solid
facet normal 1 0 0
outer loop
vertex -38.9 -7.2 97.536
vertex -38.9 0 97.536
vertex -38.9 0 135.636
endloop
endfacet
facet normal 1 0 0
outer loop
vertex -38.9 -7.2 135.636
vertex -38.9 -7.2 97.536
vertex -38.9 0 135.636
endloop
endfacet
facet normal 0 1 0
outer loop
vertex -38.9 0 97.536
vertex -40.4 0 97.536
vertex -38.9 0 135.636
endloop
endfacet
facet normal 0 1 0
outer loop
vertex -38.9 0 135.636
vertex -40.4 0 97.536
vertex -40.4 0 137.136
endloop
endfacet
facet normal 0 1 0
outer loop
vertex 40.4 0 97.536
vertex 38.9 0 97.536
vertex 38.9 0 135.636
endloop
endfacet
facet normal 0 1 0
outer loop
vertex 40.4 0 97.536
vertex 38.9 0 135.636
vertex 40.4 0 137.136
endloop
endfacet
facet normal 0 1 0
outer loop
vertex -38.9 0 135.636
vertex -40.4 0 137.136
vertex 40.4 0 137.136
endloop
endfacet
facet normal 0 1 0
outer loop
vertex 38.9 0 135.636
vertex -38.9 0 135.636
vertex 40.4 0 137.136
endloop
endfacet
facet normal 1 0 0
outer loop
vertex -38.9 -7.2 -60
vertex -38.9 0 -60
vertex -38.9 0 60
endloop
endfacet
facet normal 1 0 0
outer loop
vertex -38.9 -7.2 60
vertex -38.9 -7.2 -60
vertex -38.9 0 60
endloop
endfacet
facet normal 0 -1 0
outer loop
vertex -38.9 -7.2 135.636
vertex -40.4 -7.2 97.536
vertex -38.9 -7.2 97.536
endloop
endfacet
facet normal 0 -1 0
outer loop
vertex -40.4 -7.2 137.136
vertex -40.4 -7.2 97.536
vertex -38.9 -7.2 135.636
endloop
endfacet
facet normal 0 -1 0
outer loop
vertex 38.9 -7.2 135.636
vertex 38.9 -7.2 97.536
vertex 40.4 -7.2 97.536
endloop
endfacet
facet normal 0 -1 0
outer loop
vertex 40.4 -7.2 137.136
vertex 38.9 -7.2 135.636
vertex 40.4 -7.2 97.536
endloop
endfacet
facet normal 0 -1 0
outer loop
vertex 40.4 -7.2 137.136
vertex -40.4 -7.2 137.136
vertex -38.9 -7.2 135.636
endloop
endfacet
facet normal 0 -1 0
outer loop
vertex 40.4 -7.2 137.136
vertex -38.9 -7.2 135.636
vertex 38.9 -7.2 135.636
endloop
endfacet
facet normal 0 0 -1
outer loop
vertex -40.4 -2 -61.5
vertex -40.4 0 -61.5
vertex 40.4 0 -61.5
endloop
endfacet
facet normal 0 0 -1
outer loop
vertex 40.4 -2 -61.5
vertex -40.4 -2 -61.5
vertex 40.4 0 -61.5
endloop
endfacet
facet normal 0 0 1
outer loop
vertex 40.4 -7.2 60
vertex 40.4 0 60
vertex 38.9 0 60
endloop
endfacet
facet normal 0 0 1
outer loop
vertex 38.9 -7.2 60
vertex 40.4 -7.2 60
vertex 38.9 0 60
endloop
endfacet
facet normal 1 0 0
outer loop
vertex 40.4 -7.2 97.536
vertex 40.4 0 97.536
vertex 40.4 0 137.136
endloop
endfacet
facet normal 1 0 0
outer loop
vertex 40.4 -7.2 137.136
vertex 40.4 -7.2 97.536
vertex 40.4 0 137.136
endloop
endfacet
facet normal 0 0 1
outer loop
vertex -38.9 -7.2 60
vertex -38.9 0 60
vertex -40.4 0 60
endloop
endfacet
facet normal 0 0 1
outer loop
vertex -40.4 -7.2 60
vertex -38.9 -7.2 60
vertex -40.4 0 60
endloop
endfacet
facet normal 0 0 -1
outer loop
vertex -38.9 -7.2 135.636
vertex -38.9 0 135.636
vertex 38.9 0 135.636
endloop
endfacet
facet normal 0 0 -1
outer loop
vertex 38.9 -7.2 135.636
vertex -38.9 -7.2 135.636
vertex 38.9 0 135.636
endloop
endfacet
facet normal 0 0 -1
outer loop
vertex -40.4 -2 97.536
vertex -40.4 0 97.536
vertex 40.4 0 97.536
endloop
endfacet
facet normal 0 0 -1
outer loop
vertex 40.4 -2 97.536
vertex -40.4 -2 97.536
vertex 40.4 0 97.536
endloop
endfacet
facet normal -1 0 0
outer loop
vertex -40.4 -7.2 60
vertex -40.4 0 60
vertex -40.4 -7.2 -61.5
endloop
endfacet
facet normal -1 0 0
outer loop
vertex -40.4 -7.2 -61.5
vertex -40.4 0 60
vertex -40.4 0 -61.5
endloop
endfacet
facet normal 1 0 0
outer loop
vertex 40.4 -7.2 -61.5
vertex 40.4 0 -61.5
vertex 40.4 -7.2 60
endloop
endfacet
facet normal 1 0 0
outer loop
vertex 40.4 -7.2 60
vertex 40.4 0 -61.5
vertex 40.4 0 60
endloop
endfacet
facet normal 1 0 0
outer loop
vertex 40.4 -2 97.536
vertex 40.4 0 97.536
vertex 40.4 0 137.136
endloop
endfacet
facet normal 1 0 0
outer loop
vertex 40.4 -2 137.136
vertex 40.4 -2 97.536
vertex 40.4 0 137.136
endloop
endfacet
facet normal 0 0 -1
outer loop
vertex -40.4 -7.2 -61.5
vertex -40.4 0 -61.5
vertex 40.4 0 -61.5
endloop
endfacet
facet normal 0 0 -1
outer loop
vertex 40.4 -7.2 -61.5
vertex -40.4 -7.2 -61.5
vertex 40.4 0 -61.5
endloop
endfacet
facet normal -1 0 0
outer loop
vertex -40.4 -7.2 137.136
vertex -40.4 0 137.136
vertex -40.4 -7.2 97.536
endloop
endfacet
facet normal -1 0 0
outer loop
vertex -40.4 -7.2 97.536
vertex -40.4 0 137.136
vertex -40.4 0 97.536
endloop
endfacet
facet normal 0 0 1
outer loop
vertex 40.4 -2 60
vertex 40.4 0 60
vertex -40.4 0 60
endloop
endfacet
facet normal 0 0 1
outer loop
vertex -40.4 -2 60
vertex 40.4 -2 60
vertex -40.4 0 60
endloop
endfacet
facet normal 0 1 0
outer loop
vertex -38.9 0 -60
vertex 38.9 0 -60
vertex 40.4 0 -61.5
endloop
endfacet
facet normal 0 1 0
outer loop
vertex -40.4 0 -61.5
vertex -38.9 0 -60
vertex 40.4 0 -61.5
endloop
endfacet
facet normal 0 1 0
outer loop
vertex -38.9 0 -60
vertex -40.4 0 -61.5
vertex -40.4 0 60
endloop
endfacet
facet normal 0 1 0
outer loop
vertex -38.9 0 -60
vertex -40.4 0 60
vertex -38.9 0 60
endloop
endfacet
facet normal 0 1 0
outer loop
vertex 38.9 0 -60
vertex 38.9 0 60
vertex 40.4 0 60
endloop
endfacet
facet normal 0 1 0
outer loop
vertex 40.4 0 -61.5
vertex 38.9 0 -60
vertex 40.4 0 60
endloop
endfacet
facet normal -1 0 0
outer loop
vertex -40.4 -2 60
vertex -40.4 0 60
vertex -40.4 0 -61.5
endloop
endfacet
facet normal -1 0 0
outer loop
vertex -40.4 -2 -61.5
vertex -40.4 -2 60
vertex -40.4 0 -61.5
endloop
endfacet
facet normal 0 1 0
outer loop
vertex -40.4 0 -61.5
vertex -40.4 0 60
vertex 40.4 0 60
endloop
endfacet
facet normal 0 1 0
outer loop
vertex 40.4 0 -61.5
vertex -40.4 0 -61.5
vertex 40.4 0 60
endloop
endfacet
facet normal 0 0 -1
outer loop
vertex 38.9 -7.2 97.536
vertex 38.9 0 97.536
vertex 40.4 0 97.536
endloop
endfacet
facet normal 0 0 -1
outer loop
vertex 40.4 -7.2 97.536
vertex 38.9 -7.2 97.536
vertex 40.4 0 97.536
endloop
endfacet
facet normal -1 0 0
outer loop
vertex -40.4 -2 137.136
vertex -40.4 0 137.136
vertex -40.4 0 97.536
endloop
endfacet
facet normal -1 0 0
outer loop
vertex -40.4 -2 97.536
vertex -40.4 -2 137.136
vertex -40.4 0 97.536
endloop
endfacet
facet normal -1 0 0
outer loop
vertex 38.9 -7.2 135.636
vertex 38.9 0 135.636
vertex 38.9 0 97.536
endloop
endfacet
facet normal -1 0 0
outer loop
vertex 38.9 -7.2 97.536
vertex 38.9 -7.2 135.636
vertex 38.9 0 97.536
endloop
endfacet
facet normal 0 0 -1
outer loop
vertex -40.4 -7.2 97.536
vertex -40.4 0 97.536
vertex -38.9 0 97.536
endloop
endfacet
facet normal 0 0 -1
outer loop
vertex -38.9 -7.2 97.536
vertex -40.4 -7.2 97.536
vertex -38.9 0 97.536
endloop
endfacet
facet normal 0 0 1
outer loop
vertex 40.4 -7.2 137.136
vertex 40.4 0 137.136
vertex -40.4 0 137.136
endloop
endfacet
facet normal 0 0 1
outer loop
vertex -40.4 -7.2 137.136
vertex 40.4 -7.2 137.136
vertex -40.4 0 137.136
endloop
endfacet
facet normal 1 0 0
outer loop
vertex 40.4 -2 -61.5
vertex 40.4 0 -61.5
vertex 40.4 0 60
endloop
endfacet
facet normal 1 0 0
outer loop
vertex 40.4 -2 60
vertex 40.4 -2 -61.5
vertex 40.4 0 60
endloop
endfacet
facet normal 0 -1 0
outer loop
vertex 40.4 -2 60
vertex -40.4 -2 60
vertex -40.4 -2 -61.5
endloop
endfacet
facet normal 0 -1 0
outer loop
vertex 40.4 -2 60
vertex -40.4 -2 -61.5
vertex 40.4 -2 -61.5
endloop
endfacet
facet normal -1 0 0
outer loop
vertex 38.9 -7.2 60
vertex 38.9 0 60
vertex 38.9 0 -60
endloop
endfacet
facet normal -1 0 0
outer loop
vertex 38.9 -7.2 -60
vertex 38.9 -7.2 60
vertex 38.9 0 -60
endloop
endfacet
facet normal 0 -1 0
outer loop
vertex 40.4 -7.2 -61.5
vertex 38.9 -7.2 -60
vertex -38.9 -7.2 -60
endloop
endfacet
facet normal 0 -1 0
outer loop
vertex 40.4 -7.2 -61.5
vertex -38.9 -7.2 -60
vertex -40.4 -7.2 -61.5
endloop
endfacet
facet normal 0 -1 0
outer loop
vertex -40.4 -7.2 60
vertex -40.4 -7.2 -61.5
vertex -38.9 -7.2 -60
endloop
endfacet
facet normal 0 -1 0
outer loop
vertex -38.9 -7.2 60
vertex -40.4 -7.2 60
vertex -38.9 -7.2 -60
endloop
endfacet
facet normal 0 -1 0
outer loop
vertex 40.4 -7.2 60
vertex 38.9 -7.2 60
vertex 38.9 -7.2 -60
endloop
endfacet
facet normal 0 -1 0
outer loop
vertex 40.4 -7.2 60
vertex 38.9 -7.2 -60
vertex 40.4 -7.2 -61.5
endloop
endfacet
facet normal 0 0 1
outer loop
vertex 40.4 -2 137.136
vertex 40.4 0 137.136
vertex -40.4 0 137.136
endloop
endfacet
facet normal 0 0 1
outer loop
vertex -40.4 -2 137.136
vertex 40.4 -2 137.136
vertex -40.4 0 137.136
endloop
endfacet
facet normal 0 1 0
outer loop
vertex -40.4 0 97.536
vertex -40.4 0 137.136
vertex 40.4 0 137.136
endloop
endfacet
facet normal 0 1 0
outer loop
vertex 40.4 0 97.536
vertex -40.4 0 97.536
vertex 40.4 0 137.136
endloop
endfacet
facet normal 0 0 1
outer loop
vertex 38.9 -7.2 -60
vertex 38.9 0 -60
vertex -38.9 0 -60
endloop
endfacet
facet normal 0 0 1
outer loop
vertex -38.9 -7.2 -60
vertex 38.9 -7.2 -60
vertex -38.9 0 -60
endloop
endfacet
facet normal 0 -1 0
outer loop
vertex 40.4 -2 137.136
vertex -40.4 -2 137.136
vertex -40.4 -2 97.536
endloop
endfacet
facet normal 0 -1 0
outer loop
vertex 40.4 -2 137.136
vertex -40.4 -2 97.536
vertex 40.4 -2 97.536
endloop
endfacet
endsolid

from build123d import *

# Parameters (mm, degrees)
F1_DEPTH = 7.2
F0_W     = 77.8
F0_H     = 120
F0_H_2   = 38.1
F2_DEPTH = 2


with BuildPart() as f1:
    # F0 (on Front) → F1 (new body)
    with BuildSketch(Plane.XZ):
        Polygon((38.9, 135.635824), (38.9, 97.535824), (40.4, 97.535824), (40.4, 137.135824), (-40.4, 137.135824), (-40.4, 97.535824), (-38.9, 97.535824), (-38.9, 135.635824), align=None)
        Polygon((38.9, 60), (38.9, -60), (-38.9, -60), (-38.9, 60), (-40.4, 60), (-40.4, -61.5), (40.4, -61.5), (40.4, 60), align=None)
    extrude(amount=F1_DEPTH)


with BuildPart() as f2:
    # F0 (on Front) → F2 (new body)
    with BuildSketch(Plane.XZ):
        Polygon((38.9, 60), (38.9, -60), (-38.9, -60), (-38.9, 60), (-40.4, 60), (-40.4, -61.5), (40.4, -61.5), (40.4, 60), align=None)
        Rectangle(F0_W, F0_H)
        with Locations((0, 116.585824)):
            Rectangle(F0_W, F0_H_2)
        Polygon((38.9, 135.635824), (38.9, 97.535824), (40.4, 97.535824), (40.4, 137.135824), (-40.4, 137.135824), (-40.4, 97.535824), (-38.9, 97.535824), (-38.9, 135.635824), align=None)
    extrude(amount=F2_DEPTH)


solid = Compound([f1.part, f2.part])
